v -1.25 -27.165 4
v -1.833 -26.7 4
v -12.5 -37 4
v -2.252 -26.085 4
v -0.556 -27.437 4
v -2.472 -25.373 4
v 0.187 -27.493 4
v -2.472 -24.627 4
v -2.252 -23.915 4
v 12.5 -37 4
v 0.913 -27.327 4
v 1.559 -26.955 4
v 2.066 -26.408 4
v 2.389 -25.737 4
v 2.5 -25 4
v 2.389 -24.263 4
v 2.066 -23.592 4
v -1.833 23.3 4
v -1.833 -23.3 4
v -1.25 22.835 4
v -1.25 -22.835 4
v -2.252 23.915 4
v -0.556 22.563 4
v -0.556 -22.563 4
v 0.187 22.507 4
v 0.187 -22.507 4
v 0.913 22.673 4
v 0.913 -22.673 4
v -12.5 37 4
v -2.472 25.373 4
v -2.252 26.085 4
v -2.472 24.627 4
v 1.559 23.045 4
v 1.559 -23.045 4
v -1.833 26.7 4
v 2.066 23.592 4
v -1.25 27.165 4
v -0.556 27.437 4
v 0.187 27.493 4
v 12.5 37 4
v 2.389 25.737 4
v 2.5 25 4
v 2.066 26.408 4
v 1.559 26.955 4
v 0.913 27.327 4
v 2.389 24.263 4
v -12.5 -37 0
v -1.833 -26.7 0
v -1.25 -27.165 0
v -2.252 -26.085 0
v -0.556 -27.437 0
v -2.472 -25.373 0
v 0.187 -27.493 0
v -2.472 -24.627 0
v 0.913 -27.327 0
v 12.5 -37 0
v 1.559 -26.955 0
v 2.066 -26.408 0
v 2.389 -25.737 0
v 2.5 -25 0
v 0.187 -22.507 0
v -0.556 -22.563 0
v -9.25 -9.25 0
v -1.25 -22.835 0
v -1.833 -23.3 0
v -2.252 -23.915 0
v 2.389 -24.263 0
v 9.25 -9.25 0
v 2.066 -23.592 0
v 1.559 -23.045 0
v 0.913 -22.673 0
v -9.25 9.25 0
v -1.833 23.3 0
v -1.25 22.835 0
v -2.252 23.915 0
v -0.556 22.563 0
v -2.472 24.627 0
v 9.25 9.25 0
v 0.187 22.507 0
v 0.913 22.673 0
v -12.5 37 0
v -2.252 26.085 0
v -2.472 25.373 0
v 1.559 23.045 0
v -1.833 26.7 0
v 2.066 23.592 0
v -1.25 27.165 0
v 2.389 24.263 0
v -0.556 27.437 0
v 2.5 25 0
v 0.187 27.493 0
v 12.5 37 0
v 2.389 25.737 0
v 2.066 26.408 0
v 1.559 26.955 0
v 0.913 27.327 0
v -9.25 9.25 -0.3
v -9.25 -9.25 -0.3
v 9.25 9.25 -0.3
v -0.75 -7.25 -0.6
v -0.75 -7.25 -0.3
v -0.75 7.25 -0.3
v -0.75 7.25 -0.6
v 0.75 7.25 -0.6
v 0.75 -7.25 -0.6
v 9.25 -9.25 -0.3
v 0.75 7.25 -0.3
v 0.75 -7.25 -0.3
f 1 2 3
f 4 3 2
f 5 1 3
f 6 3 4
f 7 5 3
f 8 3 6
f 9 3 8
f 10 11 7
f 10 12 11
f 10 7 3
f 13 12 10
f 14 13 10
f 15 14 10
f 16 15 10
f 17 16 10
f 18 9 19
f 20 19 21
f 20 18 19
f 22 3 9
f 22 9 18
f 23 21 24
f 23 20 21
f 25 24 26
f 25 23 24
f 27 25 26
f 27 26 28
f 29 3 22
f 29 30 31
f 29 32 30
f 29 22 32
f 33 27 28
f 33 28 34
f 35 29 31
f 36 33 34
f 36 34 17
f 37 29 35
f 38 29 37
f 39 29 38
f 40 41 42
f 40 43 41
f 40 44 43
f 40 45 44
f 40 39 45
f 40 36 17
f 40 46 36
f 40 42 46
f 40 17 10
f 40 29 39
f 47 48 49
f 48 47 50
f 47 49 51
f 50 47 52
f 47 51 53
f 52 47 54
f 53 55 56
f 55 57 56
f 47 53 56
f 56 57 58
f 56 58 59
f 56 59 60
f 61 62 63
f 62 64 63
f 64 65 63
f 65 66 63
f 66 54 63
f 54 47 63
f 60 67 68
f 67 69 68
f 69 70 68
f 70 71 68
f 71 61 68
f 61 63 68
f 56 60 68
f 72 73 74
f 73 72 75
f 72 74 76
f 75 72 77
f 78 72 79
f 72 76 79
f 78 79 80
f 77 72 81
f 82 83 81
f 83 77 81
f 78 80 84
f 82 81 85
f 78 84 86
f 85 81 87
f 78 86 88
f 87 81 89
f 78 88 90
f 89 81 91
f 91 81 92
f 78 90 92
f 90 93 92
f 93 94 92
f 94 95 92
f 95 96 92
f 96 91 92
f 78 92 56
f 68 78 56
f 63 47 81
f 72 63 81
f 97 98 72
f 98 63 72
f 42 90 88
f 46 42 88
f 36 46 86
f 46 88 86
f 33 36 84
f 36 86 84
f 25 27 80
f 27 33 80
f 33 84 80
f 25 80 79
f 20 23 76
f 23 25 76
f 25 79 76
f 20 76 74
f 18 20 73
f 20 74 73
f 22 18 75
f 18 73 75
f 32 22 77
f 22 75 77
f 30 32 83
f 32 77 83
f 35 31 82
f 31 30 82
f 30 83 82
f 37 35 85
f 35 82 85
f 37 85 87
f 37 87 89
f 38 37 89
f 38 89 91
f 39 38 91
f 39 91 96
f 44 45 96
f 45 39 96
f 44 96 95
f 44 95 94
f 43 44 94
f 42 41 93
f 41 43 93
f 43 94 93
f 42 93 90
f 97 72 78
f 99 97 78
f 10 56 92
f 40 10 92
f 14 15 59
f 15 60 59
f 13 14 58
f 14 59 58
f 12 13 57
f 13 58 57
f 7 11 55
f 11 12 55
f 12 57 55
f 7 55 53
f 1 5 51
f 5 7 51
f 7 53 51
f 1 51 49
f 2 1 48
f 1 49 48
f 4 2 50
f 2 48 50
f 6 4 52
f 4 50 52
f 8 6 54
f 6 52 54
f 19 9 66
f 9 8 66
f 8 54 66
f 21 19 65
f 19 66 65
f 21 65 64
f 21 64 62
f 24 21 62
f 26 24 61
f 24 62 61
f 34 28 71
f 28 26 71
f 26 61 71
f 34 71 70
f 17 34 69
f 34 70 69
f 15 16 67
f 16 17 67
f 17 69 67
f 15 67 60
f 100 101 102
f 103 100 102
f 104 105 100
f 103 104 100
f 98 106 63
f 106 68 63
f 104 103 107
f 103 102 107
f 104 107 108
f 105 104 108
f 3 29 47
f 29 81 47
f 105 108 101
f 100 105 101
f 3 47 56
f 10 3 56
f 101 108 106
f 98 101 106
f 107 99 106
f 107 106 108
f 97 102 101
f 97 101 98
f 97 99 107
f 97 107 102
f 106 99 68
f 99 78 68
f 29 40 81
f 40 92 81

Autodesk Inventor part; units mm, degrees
ref_plane "YZ Plane" through (0, 0, 0) normal (1, 0, 0) x (0, 1, 0)
ref_plane "XZ Plane" through (0, 0, 0) normal (0, 1, 0) x (-1, 0, 0)
ref_plane "XY Plane" through (0, 0, 0) normal (0, 0, 1) x (1, 0, 0)
ref_plane "Arbeitsebene1" through (0, 0, 0) normal (0, 0, 1) x (1, 0, 0)
sketch "Skizze1" plane through (0, 0, 0) normal (0, 0, 1) x (1, 0, 0)
  circle A0 centre (0, -25) radius 2.5 projected
  circle A1 centre (0, 25) radius 2.5 projected
  line L0 (12.5, -37) -> (12.5, 37) projected
  line L1 (12.5, 37) -> (-12.5, 37) projected
  line L2 (-12.5, 37) -> (-12.5, -37) projected
  line L3 (-12.5, -37) -> (12.5, -37) projected
  line L4 (0.75, -9.25) -> (-0.75, -9.25) projected
  line L5 (-0.75, -9.25) -> (-0.75, 9.25) projected
  line L6 (-0.75, 9.25) -> (0.75, 9.25) projected
  line L7 (0.75, 9.25) -> (0.75, -9.25) projected
  circle A2 centre (8.5, -30) radius 1.4 projected
  circle A3 centre (-8.5, -30) radius 1.4 projected
  circle A4 centre (-8.5, 30) radius 1.4 projected
  circle A5 centre (8.5, 30) radius 1.4 projected
  point P0 (0, 0)
extrude "Extrusion1" add sketch "Skizze1" along normal blind 4 contours L3 L2 L1 L0 | L4 L5 L6 L7 | A2 | A3 | A4 | A5
sketch "Skizze2" plane through (0, 0, 0) normal (0, 0, -1) x (-1, 0, 0)
  line L0 (9.25, 9.25) -> (-9.25, 9.25) projected
  line L1 (9.25, -9.25) -> (9.25, 9.25) projected
  line L2 (-9.25, -9.25) -> (9.25, -9.25) projected
  line L3 (-9.25, 9.25) -> (-9.25, -9.25) projected
  point P0 (0, 0)
extrude "Extrusion2" add sketch "Skizze2" along normal blind 0.3
sketch "Skizze3" plane through (0, 0, -0.3) normal (0, 0, -1) x (-1, 0, 0)
  line L0 (0.75, 7.25) -> (-0.75, 7.25) projected
  line L1 (0.75, -23.701) -> (0.75, 23.701) projected
  line L2 (-0.75, 23.701) -> (-0.75, -23.701) projected
  line L3 (-0.75, -7.25) -> (0.75, -7.25) projected
  line L4 (0.75, 7.25) -> (-0.75, 7.25)
  line L5 (-0.75, 7.25) -> (-0.75, -7.25)
  line L6 (-0.75, -7.25) -> (0.75, -7.25)
  line L7 (0.75, -7.25) -> (0.75, 7.25)
  point P0 (0, 0)
extrude "Extrusion3" add sketch "Skizze3" along normal blind 0.3
properties part number "40_microfluidic_chip_lightsheet_layer1_negative_mould_lower_v0"
